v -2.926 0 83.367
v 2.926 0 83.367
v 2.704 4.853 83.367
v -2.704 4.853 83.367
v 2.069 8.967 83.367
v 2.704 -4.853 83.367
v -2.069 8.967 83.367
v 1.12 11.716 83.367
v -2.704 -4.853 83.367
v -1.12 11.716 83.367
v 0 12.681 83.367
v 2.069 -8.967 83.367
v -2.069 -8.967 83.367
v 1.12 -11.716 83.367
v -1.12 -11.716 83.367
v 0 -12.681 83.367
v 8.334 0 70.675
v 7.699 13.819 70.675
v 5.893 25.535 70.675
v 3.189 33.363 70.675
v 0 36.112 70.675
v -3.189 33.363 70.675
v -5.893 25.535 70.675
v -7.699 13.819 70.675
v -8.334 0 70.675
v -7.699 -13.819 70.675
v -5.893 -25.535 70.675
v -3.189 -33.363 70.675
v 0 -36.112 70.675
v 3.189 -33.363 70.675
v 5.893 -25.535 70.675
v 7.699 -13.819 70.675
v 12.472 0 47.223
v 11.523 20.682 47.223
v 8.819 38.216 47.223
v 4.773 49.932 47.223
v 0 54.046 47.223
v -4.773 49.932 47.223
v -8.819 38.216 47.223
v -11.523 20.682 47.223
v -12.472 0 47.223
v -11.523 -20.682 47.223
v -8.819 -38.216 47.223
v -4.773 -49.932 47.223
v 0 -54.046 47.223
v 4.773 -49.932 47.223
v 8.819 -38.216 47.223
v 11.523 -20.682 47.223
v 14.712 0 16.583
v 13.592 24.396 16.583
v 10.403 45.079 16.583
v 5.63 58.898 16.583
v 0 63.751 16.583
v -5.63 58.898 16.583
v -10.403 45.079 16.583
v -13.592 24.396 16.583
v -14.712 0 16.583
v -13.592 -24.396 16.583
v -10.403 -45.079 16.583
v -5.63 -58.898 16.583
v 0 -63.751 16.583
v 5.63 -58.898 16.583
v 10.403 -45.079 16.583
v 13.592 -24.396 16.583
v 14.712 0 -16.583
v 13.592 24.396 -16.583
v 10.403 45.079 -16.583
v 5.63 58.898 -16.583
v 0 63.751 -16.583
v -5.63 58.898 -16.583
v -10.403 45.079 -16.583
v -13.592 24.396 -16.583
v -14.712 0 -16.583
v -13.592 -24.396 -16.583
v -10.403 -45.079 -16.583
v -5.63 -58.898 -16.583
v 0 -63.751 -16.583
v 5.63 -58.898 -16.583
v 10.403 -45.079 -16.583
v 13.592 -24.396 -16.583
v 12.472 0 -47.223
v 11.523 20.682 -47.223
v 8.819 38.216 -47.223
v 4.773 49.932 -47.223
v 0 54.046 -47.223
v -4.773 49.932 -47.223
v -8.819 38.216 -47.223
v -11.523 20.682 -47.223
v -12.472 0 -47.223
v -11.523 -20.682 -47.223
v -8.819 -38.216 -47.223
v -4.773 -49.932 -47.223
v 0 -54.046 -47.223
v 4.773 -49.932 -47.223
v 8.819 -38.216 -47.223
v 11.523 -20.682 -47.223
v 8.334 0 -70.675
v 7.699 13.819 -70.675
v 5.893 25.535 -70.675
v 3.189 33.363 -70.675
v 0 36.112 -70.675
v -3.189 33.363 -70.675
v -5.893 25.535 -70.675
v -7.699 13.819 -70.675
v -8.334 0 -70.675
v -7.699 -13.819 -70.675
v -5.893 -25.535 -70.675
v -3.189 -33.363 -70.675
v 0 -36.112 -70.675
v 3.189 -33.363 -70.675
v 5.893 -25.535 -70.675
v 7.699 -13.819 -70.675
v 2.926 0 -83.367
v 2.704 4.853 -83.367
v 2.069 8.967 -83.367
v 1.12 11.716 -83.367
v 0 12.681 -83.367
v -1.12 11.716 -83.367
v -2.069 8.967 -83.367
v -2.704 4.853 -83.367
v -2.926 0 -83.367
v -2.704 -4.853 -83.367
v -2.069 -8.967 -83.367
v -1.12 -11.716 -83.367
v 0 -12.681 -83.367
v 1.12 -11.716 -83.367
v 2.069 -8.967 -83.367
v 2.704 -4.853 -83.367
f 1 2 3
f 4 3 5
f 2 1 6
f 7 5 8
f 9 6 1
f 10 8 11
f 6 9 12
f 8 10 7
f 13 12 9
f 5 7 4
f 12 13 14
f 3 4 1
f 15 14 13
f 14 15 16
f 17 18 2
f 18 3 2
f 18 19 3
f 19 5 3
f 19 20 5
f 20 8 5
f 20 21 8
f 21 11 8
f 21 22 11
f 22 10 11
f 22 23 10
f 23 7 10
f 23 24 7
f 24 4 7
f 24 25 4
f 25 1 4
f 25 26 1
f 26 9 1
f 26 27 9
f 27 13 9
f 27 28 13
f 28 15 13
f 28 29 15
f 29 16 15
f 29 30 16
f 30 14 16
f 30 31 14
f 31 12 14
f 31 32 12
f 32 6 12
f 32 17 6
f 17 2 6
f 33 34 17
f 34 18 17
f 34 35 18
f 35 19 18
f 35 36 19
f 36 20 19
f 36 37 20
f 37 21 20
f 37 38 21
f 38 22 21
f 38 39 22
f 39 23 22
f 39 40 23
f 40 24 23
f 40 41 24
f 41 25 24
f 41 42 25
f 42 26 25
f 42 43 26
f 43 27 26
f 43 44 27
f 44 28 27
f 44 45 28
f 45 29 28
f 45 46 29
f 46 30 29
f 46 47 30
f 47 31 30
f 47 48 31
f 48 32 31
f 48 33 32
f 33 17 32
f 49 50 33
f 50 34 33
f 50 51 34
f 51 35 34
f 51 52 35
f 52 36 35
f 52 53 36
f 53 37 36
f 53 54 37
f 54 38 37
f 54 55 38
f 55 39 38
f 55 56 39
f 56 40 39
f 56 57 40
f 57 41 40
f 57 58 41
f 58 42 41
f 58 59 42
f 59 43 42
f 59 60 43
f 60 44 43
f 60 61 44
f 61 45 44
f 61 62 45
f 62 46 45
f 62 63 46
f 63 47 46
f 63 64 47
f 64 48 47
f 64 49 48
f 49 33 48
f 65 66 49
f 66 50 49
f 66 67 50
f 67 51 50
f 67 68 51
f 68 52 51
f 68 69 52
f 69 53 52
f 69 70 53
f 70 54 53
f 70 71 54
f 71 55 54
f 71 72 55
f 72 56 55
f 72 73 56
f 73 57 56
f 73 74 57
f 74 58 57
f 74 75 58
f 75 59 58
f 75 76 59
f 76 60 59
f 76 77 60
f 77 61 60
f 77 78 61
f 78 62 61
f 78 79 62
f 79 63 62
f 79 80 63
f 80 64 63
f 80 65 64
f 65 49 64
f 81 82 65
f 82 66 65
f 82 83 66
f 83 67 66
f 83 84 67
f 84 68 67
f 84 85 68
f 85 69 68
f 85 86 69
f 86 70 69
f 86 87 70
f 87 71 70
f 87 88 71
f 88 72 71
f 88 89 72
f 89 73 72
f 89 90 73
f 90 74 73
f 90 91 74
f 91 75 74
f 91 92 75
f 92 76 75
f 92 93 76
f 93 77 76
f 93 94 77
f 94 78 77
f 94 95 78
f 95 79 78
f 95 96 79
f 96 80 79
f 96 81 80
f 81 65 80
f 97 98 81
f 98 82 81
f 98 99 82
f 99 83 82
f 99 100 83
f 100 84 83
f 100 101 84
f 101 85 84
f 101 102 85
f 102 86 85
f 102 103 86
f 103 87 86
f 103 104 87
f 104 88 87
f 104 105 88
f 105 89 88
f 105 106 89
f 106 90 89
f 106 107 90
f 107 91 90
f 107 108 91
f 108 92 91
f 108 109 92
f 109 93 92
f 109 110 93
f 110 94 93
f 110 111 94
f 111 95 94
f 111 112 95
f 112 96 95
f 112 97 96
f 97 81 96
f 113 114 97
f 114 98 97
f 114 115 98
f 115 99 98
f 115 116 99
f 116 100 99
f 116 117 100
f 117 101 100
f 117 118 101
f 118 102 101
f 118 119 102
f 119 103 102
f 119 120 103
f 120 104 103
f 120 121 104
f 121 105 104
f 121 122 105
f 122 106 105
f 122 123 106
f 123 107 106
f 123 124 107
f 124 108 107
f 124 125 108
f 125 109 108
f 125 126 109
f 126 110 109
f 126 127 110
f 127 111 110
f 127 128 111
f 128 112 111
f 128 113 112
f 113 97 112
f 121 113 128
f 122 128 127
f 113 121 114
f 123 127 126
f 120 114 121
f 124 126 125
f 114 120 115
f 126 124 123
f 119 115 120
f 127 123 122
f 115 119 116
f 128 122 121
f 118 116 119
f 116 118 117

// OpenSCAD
// Generated by SolidPython 1.0.1 on 2020-07-29 00:46:45


scale(v = [3, 13, 17]) {
	sphere(r = 5);
}
/***********************************************
*********      SolidPython code:      **********
************************************************
 
# import packages: SolidPython
from solid import *
from solid.utils import *
from itertools import chain, combinations, permutations


class Resize:

    def __init__(self, scad_file):
        self.scad_file = scad_file
        #self.scad_file = import_scad(scad_file)
        # cone/cylinder param:
        self.r1 = 0
        self.r2 = 0
        self.h = 0
        # rectangular prism param:
        self.w = 0
        self.l = 0
        # ellipse param:
        self.r = 0

    # import OpenScad code (file name corresponds to shape)


    # classify shape + parameters
    def assign(self, param1, param2, param3):
        if self.scad_file == 'cone.scad':
            self.r1 = param1
            self.r2 = param2
            self.h = param3
        elif self.scad_file == 'cylinder.scad':
            self.r1 = param1
            self.r2 = param2
            self.h = param3
        elif self.scad_file == 'rectangularPrism.scad':
            self.h = param1
            self.l = param2
            self.w = param3
        else:
            self.r = param1
            self.h = param2

    # resize parameters
    def iterate(self):
        x = range(3, 20, 2)
        i = 1
        if self.scad_file == 'cone.scad':
            tempList = list(permutations(x, 2))
            for temp in tempList:
                param1 = temp[0]
                param2 = temp[1]
                filepath = 'produced_scad_files/' + 'cone' + str(param1) + '_' + str(param2) + '_' + '.scad'
                scad_render_to_file(cylinder(h=param1, r1=param2, r2=0), filepath)

        elif self.scad_file == 'cylinder.scad':
            tempList = list(permutations(x, 3))
            for temp in tempList:
                param1 = temp[0]
                param2 = temp[1]
                filepath = 'produced_scad_files/' + 'cylinder' + str(param1) + '_' + str(param2) + '_' + '.scad'
                scad_render_to_file(cylinder(h=param1, r1=param2, r2=param2), filepath)

        elif self.scad_file == 'rectangularPrism.scad':
            tempList = list(permutations(x, 3))
            for temp in tempList:
                param1 = temp[0]
                param2 = temp[1]
                param3 = temp[2]
                filepath = 'produced_scad_files/' + 'rectangularPrism' + str(param1) + '_' + str(param2) + '_' + str(
                    param3) + '.scad'
                scad_render_to_file(cube(size=(param1, param2, param3)), filepath)

        elif self.scad_file == 'ellipse.scad':
            tempList = list(permutations(x, 4))
            for temp in tempList:
                param1 = temp[0]
                param2 = temp[1]
                param3 = temp[2]
                param4 = temp[3]
                filepath = 'produced_scad_files/' + 'ellipse' + str(param1) + '_' + str(param2) + '_' + str(param3) + '_' + str(param4) + '.scad'
                scad_render_to_file(scale([param1, param2, param3])(sphere(r=param4)), filepath)

    def render_to_scadfile(self):
        scad_render_to_file(scad, 'example.scad') 
 
************************************************/
